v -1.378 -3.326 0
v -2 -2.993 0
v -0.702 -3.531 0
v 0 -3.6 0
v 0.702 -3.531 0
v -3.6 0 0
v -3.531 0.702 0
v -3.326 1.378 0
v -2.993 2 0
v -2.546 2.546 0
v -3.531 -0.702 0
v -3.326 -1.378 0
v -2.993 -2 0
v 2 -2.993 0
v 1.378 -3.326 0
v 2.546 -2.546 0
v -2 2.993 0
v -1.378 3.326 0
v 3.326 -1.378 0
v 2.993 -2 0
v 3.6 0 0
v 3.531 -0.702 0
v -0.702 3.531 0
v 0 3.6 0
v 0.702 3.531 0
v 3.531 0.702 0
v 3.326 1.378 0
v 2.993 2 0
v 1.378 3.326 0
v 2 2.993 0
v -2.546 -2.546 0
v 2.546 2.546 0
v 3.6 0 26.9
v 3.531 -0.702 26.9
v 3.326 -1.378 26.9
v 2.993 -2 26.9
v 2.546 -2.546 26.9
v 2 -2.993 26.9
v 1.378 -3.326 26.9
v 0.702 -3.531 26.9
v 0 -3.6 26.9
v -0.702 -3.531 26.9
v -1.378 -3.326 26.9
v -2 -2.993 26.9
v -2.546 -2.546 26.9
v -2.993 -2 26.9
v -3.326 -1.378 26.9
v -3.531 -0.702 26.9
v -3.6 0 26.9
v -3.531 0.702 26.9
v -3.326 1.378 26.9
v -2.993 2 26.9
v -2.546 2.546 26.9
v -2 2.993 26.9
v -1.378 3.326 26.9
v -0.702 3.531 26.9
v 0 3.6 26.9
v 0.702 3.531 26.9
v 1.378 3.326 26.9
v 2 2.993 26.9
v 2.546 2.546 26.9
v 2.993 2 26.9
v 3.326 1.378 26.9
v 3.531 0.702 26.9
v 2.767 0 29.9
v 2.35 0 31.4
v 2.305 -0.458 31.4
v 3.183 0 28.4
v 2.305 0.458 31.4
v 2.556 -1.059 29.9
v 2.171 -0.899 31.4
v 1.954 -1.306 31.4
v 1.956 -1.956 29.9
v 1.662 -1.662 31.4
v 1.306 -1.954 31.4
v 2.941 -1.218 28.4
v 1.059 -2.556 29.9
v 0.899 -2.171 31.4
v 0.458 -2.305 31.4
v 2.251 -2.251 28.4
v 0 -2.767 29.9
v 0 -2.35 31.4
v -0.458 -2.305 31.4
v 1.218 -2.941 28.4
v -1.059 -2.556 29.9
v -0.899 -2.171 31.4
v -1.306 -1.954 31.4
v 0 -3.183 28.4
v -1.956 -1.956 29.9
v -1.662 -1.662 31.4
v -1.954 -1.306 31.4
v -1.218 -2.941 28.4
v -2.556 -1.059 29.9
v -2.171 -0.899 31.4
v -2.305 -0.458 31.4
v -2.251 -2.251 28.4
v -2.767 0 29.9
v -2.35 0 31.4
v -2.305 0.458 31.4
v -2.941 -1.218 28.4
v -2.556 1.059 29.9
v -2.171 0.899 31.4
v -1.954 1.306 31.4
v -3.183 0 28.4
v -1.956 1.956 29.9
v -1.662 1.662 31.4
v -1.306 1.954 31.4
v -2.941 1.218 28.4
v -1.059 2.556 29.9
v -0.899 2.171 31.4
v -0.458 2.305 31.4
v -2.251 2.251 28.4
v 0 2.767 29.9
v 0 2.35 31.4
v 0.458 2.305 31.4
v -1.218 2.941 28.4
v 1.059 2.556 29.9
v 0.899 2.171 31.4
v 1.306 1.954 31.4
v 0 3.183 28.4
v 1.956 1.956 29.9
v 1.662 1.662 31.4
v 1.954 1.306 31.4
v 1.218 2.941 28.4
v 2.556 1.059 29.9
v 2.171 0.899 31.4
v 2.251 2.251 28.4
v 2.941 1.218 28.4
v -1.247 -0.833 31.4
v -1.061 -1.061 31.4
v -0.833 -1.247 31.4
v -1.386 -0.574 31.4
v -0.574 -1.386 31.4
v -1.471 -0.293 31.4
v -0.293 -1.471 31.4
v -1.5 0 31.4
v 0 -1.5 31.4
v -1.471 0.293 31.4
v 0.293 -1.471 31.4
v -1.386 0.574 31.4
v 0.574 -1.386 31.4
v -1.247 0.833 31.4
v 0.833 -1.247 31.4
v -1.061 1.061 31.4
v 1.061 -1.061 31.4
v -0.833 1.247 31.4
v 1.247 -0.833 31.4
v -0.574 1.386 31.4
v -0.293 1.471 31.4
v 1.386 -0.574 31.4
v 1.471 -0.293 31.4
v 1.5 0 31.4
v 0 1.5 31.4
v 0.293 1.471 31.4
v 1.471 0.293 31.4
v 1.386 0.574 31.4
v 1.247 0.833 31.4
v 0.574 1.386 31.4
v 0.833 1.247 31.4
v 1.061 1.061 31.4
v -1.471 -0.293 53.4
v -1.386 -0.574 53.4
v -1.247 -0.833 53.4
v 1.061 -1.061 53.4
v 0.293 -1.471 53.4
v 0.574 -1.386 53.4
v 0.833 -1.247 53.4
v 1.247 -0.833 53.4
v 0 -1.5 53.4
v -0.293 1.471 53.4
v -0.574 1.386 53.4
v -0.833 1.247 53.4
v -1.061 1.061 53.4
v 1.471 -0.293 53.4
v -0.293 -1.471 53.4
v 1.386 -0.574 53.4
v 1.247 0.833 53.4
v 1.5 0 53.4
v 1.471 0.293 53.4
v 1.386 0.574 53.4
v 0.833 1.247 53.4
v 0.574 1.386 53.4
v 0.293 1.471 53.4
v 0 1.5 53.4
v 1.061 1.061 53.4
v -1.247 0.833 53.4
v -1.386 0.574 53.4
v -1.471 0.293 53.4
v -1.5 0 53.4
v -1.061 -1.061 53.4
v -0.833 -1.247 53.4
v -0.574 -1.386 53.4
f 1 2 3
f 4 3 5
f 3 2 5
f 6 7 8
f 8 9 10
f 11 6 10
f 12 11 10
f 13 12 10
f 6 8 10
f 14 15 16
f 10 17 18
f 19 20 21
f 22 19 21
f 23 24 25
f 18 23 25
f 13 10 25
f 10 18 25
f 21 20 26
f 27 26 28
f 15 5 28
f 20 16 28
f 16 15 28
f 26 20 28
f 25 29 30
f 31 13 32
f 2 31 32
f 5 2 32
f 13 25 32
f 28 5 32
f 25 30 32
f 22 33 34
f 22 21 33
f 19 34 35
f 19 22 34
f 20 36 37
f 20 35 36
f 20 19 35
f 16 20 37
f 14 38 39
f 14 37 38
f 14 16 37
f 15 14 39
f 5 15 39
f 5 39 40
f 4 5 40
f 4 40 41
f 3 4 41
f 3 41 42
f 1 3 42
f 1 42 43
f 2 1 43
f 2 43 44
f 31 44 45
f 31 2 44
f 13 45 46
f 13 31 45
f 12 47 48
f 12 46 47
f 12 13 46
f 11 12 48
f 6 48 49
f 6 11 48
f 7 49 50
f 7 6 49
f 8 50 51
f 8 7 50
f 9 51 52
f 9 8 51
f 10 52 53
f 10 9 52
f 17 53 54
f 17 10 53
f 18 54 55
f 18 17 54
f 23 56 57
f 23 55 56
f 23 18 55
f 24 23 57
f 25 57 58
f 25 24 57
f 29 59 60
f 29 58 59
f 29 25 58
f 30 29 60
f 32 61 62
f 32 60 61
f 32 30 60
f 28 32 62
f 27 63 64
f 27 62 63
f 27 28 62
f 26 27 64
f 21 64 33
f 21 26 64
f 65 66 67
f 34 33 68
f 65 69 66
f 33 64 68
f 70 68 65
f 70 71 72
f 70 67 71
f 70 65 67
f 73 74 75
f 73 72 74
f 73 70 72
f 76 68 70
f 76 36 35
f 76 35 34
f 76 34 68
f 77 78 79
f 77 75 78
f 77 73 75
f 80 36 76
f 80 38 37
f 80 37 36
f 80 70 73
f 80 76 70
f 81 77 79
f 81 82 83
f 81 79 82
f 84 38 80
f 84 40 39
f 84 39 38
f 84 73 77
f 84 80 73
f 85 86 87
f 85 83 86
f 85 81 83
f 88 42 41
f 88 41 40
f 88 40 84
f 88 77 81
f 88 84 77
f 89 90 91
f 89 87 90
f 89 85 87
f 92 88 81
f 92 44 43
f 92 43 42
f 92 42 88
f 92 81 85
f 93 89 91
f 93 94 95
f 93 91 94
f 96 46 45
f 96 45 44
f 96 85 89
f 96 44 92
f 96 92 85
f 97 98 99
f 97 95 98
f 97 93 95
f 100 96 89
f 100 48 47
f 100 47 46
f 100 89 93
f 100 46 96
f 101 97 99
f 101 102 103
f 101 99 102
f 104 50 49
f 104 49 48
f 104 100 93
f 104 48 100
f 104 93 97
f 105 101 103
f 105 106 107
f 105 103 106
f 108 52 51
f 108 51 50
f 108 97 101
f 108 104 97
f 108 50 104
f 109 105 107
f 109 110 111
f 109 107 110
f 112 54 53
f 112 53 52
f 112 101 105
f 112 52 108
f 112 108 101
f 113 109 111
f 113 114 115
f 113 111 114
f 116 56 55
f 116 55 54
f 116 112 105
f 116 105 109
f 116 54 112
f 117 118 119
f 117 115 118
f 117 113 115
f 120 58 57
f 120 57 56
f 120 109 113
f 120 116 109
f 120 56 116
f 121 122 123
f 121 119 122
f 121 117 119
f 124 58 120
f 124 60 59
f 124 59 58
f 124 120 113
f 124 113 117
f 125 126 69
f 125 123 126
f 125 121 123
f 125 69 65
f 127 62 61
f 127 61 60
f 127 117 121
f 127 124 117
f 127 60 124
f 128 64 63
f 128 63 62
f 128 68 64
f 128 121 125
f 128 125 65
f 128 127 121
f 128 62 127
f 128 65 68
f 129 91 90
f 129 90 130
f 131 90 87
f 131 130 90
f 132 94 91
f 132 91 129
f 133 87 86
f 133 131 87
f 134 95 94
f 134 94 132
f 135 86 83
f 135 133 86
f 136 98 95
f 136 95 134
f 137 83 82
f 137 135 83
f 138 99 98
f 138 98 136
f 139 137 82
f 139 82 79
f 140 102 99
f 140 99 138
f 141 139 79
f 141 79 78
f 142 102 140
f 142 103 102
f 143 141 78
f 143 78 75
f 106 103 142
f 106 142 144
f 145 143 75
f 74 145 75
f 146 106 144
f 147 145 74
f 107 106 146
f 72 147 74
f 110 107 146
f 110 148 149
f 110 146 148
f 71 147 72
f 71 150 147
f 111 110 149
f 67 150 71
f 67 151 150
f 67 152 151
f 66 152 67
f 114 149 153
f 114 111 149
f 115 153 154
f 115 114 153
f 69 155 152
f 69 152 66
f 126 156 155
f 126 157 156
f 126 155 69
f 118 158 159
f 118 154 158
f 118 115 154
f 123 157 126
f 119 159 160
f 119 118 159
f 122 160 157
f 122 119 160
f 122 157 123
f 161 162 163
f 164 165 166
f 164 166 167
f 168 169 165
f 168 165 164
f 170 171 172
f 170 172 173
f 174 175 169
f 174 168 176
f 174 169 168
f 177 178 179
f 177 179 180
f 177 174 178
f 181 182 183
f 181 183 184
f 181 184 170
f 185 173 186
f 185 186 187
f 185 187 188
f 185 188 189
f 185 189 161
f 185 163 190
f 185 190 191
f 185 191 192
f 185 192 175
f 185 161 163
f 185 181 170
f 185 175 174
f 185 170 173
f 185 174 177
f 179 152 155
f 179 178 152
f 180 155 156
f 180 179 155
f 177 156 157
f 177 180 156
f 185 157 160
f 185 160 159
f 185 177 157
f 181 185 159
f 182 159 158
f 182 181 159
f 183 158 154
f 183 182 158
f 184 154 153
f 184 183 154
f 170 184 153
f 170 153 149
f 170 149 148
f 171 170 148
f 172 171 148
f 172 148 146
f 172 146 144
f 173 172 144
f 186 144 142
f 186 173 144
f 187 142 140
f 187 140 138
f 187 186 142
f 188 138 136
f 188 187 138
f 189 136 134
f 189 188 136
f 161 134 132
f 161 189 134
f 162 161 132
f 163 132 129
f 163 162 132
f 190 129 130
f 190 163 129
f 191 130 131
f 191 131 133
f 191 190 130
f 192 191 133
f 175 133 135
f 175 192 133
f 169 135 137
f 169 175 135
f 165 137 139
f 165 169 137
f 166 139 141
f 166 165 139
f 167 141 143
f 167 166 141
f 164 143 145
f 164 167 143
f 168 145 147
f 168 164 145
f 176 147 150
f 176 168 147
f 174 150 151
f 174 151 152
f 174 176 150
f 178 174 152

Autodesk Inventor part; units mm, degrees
ref_plane "YZ Plane" through (0, 0, 0) normal (1, 0, 0) x (0, 1, 0)
ref_plane "XZ Plane" through (0, 0, 0) normal (0, 1, 0) x (-1, 0, 0)
ref_plane "XY Plane" through (0, 0, 0) normal (0, 0, 1) x (1, 0, 0)
sketch "Sketch1" plane through (0, 0, 0) normal (0, 0, 1) x (1, 0, 0)
  circle A0 centre (0, 0) radius 3.6
  dimension "d0" = 7.2
extrude "Extrusion1" add sketch "Sketch1" along normal blind 53.4
sketch "Sketch2" plane through (0, 0, 53.4) normal (0, 0, 1) x (1, 0, 0)
  circle A0 centre (0, 0) radius 1.5
  circle A1 centre (0, 0) radius 3.6
  dimension "d3" = 3
  dimension "d4" = 7.2
extrude "Extrusion2" cut sketch "Sketch2" against normal blind 22
sketch "Sketch3" plane through (0, 0, 31.4) normal (0, 0, 1) x (1, 0, 0)
  circle A0 centre (0, 0) radius 3.6
  circle A1 centre (0, 0) radius 2.35
  dimension "d7" = 7.2
  dimension "d8" = 4.7
chamfer "Chamfer1" distance 4.5 distance2 1.25 1 edges at (-3.6, 0, 31.4) measured on face at (3.5534, -0.5775, 20.9333)
properties part number "Solenoid_pin"
